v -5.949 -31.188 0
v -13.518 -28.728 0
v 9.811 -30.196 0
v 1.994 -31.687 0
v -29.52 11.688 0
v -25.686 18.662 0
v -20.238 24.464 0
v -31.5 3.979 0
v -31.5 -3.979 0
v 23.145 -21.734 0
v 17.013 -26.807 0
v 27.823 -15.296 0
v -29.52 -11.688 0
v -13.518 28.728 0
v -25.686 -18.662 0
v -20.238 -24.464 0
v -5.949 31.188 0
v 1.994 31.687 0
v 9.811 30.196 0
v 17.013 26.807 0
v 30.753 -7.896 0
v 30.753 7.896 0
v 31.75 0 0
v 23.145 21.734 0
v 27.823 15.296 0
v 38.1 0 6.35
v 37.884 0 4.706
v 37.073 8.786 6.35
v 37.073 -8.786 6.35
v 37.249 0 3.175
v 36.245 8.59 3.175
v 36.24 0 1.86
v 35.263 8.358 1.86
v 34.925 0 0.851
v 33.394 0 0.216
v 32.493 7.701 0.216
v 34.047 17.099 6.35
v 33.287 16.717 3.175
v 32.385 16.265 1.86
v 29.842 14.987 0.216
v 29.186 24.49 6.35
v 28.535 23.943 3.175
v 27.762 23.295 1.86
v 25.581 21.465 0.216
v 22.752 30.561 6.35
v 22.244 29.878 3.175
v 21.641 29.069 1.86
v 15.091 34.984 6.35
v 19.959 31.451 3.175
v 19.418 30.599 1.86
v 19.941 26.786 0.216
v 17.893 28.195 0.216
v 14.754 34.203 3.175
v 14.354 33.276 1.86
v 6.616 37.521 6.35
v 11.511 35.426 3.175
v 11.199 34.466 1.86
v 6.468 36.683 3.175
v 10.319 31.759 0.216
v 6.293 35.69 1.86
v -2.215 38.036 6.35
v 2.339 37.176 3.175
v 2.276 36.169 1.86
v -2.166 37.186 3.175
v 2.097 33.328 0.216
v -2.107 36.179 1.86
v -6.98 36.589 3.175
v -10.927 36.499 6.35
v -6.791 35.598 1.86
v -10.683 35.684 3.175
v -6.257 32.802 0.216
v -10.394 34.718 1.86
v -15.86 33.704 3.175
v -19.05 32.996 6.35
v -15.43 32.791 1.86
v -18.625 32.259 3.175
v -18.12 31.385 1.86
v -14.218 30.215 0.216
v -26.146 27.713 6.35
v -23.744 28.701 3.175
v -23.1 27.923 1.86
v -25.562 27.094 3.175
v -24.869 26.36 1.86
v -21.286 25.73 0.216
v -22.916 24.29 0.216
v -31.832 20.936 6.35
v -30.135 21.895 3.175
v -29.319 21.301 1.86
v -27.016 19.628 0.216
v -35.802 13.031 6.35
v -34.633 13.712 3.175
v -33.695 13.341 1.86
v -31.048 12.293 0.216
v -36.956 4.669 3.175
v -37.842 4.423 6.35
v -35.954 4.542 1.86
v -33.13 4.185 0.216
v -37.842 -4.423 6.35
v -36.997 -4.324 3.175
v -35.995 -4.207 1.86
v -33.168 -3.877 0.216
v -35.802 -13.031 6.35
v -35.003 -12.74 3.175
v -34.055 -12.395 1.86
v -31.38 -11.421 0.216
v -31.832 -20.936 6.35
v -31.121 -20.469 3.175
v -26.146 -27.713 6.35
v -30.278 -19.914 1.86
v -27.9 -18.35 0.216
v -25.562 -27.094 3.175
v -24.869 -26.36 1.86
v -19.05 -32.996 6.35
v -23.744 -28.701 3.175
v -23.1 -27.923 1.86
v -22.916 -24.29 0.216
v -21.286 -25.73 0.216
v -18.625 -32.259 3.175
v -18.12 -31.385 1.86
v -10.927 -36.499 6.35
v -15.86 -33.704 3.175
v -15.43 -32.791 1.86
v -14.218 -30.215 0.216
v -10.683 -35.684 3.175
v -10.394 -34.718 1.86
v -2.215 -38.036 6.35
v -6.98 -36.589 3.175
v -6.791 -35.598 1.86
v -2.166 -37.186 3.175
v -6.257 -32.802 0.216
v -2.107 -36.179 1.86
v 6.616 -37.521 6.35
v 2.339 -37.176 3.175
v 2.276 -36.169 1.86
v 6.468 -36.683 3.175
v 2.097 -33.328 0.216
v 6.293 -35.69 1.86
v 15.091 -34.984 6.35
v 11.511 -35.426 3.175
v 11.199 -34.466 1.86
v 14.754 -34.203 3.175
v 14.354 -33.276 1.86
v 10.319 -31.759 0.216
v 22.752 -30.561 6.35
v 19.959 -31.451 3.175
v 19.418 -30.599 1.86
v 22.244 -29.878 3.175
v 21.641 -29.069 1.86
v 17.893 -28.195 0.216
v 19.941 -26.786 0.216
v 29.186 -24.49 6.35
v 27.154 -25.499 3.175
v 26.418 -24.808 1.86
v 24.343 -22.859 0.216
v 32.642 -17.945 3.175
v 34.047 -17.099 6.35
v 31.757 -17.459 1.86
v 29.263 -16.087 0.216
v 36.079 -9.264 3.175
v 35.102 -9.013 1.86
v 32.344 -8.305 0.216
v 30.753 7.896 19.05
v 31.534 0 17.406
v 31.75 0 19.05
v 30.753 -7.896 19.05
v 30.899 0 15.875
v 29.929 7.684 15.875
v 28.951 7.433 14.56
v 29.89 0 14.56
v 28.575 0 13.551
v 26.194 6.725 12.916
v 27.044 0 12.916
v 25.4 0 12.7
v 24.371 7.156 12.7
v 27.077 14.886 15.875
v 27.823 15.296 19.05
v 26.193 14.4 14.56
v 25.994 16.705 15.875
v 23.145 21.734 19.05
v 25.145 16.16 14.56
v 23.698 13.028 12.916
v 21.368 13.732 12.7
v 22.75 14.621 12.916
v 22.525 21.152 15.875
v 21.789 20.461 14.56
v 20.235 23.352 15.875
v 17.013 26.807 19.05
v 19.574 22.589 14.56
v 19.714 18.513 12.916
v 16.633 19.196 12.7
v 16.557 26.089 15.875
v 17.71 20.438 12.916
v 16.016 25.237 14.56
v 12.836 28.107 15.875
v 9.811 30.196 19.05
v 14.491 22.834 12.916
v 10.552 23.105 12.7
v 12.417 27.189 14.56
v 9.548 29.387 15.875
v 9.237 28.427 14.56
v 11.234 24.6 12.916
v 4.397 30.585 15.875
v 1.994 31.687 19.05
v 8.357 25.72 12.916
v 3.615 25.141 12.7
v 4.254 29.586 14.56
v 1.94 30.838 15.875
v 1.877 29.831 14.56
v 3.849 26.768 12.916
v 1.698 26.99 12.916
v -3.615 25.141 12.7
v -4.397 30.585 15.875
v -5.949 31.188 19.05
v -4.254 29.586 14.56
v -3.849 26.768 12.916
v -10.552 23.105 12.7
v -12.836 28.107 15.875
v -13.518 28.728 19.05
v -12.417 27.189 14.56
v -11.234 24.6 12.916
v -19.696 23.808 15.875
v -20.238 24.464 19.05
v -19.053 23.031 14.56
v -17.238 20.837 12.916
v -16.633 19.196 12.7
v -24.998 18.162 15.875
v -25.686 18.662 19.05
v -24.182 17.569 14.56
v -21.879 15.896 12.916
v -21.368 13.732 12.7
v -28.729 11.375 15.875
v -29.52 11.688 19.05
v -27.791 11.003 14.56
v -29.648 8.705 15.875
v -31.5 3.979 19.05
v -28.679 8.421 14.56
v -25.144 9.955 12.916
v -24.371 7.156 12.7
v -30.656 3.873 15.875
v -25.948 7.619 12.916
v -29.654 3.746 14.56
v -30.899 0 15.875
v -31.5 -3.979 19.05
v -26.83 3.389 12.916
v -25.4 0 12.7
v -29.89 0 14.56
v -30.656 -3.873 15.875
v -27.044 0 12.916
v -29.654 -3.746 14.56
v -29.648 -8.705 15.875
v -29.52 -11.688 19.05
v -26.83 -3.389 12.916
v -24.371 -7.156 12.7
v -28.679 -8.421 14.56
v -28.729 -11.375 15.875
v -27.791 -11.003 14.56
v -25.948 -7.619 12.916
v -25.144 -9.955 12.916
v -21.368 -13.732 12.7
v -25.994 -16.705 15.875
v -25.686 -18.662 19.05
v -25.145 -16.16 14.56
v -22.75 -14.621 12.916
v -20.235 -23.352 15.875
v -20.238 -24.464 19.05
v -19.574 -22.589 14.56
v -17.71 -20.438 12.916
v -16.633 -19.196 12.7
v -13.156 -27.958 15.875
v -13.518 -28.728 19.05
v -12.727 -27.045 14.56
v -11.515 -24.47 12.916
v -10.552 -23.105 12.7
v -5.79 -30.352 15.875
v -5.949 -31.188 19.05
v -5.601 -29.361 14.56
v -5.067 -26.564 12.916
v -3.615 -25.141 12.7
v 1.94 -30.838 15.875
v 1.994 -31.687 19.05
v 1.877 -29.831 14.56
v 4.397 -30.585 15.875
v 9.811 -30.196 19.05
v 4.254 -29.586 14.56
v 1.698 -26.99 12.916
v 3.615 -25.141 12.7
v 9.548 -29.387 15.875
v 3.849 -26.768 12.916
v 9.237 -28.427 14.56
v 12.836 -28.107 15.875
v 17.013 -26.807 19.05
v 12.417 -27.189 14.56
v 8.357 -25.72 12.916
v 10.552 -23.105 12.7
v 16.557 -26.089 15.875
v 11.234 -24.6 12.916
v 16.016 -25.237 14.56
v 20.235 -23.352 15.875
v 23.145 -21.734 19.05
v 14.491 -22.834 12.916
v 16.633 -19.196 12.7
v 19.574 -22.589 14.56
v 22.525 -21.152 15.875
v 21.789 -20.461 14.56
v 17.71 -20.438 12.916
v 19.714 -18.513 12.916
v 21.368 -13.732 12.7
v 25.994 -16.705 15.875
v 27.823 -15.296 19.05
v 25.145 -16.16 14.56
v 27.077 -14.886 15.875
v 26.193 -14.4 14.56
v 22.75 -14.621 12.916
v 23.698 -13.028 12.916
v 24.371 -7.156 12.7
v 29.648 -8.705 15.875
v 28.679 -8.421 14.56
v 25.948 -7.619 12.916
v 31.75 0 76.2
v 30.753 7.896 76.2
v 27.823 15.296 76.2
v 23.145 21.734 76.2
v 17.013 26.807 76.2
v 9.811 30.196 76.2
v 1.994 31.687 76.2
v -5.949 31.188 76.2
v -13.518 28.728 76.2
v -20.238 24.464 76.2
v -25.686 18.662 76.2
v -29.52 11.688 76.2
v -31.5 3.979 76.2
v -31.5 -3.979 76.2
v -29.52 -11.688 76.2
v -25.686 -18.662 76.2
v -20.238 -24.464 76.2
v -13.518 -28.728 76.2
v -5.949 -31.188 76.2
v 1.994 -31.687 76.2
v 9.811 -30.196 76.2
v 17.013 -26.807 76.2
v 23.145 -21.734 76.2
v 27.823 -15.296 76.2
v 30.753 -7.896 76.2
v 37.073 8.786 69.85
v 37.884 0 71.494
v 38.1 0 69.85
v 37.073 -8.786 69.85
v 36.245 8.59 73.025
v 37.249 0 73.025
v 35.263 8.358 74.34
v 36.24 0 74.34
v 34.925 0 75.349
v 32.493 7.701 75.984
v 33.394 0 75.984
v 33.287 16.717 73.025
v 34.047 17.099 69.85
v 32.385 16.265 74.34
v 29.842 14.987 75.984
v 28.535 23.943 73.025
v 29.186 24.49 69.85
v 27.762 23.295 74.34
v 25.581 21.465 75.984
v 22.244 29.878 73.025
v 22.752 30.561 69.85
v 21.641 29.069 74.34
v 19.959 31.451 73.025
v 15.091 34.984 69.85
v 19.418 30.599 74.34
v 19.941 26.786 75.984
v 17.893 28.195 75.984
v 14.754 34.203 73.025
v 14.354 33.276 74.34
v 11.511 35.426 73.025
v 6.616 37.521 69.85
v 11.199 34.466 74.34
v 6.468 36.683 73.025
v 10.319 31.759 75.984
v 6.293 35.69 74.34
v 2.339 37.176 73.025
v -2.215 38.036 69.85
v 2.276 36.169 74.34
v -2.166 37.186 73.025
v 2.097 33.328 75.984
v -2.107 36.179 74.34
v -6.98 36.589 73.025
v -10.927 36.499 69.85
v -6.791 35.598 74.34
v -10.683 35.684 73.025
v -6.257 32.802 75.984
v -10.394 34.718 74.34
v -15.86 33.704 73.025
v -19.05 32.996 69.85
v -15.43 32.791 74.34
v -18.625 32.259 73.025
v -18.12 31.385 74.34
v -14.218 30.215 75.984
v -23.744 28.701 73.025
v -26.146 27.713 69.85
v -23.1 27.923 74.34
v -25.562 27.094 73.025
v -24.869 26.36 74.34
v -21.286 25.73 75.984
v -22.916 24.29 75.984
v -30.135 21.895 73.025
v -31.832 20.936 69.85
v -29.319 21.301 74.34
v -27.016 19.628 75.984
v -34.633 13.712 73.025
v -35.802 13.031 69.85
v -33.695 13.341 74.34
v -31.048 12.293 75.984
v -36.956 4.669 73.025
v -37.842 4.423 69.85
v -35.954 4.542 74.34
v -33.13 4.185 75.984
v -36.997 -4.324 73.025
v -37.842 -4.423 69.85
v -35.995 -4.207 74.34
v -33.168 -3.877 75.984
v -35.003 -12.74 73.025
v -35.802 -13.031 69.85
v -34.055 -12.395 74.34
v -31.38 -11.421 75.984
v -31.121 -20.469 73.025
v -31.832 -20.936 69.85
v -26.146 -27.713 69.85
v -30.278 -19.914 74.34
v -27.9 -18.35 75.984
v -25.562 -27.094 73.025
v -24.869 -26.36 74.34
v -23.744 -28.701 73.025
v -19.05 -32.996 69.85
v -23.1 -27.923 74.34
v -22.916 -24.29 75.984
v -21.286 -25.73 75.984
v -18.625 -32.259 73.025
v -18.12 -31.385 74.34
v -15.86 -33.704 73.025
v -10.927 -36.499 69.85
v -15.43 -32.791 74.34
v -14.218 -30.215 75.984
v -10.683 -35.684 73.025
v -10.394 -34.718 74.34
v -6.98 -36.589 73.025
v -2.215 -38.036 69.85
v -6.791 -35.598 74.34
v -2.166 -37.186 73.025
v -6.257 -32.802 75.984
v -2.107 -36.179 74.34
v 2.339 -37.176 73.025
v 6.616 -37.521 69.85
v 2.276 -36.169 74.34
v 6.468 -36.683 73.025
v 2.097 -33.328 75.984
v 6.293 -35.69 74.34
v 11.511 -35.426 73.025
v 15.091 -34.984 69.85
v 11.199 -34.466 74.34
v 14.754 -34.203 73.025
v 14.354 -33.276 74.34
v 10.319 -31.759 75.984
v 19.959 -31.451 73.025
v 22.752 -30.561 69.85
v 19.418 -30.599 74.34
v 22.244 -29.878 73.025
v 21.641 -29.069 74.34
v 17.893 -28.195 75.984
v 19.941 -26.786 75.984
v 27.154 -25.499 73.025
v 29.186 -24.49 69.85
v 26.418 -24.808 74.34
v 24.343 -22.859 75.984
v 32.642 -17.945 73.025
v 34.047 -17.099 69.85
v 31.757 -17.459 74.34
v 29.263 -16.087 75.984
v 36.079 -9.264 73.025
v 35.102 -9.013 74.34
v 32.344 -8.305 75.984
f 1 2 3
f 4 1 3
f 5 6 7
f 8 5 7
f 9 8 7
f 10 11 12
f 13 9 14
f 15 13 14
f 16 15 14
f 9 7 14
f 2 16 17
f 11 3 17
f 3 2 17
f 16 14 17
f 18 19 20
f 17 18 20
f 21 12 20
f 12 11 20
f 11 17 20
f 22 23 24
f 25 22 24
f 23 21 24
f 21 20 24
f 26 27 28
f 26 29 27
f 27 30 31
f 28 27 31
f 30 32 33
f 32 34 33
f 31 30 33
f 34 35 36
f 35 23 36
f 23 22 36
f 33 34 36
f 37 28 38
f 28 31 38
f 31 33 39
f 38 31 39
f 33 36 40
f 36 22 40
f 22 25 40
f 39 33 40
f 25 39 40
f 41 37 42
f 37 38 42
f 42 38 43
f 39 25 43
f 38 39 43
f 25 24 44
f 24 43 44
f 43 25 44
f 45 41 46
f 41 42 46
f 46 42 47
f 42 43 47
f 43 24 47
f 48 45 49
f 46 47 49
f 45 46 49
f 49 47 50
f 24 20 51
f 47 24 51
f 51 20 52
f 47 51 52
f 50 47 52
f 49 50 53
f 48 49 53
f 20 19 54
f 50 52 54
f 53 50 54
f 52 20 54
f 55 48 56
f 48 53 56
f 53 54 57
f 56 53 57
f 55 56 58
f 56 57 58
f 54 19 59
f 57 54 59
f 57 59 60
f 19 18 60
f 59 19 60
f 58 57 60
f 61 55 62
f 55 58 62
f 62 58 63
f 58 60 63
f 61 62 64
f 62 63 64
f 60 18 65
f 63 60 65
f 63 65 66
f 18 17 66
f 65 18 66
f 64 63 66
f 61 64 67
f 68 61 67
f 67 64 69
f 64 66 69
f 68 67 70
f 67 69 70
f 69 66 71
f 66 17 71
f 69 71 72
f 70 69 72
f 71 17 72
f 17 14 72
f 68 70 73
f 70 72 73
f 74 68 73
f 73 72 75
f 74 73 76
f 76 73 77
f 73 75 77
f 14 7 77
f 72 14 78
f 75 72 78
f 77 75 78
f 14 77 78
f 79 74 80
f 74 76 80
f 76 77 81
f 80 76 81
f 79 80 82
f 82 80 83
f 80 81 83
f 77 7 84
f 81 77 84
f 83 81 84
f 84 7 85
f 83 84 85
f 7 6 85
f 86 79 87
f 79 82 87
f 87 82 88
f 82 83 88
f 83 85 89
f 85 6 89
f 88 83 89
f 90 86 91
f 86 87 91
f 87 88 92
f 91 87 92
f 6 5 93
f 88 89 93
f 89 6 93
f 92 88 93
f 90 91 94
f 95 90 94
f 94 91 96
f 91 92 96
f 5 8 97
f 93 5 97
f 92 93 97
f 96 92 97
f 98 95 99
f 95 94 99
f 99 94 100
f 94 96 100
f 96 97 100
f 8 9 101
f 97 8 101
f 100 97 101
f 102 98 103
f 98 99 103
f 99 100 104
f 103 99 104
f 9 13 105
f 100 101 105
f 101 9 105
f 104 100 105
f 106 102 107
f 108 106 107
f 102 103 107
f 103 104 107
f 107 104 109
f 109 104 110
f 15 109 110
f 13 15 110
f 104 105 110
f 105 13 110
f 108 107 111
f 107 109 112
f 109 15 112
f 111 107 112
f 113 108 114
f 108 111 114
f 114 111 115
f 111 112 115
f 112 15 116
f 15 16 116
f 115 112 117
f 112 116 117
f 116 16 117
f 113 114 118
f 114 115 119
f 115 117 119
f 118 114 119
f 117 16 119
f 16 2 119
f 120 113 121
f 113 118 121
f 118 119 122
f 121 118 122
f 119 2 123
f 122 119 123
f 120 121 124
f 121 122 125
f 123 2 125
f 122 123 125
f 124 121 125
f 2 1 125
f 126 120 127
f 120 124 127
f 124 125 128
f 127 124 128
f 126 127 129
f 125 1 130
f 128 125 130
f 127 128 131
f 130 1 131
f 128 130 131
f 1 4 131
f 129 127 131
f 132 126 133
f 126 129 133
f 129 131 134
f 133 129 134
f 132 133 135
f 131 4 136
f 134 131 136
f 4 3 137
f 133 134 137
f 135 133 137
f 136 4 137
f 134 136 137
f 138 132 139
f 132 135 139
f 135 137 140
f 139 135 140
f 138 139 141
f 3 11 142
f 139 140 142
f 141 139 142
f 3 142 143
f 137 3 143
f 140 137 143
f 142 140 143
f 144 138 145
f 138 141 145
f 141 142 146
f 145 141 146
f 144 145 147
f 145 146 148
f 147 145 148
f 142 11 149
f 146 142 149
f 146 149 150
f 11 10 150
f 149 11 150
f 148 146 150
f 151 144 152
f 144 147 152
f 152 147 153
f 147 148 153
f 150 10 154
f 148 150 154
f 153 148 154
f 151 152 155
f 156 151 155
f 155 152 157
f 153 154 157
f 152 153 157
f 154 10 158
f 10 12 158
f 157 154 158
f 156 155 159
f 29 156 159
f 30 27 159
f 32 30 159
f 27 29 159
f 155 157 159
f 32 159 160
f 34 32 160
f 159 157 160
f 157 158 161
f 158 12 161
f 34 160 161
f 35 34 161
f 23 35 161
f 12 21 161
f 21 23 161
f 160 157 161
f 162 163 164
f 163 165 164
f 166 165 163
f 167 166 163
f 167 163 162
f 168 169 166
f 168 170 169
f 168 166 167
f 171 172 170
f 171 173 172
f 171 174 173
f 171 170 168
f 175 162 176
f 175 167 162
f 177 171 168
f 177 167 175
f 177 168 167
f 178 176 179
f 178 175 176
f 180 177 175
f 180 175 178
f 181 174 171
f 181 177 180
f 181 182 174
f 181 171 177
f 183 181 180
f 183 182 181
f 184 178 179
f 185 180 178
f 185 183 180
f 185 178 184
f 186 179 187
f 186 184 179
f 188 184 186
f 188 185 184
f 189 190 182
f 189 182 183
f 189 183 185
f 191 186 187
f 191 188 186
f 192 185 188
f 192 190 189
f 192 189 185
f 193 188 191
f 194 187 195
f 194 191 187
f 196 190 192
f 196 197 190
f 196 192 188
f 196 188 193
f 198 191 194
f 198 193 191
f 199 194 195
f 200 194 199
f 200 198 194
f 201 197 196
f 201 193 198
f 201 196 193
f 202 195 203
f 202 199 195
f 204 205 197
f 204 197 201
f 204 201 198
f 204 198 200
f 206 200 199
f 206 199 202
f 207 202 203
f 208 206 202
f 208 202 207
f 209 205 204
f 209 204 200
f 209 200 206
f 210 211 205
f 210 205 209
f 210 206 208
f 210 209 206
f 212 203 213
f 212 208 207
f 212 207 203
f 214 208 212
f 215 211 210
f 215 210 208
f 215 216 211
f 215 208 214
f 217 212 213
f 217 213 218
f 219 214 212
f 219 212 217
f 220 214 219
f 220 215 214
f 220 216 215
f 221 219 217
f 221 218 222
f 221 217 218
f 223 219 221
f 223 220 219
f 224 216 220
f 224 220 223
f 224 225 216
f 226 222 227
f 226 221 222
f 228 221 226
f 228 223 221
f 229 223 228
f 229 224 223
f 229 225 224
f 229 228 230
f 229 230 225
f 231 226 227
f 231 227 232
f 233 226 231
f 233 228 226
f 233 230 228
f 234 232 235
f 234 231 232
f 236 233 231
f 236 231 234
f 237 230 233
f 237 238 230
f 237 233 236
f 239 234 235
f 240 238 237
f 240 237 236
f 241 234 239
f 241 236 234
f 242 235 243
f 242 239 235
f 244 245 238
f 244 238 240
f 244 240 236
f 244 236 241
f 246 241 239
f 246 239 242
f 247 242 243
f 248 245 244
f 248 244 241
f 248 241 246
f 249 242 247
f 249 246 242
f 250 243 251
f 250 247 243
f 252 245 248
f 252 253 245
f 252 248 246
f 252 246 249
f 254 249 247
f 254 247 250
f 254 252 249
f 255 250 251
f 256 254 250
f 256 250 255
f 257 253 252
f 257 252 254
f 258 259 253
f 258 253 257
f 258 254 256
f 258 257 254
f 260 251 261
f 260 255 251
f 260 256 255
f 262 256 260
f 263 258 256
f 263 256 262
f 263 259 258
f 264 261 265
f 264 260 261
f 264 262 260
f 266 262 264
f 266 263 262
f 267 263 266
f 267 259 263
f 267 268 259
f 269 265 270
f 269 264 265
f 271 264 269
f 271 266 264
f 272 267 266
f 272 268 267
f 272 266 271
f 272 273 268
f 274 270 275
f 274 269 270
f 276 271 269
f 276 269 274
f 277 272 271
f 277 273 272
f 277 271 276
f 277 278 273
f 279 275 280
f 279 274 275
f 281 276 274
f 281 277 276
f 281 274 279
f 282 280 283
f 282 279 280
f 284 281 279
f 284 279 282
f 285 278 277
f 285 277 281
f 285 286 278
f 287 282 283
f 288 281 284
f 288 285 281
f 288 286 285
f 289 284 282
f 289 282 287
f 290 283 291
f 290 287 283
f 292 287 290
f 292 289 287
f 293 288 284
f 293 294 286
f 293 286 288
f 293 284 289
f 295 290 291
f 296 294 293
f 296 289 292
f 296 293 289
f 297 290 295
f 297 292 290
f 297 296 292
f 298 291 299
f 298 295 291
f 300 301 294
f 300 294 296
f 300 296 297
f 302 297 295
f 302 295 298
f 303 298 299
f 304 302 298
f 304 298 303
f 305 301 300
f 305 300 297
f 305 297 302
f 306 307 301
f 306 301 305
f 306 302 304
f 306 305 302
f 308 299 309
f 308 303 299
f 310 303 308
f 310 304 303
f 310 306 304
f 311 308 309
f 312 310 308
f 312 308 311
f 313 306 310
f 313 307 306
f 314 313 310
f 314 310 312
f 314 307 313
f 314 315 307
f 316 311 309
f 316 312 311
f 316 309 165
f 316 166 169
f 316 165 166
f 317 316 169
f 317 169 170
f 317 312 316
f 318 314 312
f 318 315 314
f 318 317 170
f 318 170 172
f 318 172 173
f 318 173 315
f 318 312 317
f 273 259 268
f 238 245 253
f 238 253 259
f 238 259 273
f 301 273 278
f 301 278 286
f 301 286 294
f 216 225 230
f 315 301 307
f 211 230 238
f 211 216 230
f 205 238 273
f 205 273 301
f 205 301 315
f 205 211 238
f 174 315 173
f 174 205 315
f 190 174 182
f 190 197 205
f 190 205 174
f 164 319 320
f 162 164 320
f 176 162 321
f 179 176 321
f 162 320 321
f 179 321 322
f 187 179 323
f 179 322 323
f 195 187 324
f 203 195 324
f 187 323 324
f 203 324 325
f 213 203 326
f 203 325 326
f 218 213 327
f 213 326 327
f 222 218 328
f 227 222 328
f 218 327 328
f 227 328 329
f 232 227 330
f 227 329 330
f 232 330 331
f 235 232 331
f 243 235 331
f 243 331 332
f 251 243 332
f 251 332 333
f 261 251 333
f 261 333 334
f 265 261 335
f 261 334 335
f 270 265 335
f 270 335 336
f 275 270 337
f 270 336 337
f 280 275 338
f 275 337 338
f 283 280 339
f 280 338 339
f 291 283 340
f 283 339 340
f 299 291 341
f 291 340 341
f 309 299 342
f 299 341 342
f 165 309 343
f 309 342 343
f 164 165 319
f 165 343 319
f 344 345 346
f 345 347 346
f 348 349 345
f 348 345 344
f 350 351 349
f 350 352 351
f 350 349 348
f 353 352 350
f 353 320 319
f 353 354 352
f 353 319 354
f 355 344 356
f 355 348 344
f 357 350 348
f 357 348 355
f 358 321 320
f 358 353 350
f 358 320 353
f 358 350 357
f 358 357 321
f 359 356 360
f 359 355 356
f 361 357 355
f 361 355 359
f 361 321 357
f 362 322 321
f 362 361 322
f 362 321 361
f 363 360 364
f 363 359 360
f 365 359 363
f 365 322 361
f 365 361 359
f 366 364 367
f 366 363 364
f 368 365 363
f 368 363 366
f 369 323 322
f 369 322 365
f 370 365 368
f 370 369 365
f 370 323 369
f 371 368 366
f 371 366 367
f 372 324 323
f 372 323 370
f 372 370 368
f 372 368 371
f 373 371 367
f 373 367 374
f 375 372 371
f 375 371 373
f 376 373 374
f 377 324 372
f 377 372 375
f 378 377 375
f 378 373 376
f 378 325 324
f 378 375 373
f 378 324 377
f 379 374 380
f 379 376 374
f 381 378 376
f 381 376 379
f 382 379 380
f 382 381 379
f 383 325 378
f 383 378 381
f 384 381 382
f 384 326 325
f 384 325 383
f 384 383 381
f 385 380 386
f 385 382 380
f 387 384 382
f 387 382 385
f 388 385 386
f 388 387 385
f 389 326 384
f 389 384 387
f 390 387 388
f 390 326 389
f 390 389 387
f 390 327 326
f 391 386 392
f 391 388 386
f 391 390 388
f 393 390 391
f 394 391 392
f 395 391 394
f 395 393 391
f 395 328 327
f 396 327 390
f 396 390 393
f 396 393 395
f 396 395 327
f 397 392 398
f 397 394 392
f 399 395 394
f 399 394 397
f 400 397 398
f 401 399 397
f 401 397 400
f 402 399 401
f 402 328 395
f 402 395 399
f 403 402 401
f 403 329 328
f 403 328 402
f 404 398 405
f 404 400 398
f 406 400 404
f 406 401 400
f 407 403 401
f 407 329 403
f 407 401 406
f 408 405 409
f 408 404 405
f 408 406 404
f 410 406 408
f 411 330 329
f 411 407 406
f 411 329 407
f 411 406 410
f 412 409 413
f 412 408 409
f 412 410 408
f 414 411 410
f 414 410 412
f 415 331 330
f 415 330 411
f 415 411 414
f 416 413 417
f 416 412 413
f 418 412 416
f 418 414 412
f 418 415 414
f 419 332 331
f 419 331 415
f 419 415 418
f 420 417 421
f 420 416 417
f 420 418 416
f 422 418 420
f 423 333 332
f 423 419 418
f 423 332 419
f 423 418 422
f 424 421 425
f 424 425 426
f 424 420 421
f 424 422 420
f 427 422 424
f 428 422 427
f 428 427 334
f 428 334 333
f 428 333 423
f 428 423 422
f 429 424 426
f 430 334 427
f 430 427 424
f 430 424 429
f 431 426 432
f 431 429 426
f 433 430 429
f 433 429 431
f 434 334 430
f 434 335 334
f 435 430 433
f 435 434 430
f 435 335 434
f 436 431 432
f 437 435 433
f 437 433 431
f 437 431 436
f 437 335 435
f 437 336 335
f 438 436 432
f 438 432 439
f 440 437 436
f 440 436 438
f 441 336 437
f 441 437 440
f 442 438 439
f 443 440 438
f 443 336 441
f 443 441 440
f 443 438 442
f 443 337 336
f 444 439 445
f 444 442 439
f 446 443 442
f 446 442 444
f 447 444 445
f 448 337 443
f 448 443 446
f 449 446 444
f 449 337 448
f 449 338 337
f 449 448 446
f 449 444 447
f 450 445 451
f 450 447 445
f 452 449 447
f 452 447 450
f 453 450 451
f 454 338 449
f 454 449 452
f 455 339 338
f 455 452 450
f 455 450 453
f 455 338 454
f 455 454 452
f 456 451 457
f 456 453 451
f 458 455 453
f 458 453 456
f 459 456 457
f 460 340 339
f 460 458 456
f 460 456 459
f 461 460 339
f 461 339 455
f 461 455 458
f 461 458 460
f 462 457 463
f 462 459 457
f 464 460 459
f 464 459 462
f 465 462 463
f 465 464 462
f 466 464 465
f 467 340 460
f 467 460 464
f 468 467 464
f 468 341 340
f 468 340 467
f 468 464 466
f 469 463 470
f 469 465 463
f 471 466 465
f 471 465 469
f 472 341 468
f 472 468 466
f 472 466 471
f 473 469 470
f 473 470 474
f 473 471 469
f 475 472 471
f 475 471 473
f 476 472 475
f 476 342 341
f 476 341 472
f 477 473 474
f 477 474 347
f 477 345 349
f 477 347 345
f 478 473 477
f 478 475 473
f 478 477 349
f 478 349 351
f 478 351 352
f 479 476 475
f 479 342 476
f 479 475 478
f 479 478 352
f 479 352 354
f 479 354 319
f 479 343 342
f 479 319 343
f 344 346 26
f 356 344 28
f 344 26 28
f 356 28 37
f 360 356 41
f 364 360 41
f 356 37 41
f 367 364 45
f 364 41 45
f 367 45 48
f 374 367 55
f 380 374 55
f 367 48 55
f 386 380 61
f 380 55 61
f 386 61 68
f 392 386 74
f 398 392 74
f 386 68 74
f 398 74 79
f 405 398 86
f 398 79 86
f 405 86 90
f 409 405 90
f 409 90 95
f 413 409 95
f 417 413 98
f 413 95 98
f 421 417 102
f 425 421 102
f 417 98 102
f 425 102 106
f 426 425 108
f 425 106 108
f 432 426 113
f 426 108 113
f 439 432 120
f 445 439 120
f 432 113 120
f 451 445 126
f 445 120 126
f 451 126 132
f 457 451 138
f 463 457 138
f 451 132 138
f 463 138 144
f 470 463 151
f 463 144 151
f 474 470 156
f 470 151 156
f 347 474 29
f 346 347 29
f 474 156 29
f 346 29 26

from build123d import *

# Parameters (mm, degrees)
F0_R     = 38.1
F1_DEPTH = 76.2
F2_R     = 6.35
F3_R     = 31.75
F4_DEPTH = 63.5
F5_R     = 6.35


with BuildPart() as f1:
    # F0 (on Top) → F1 (new body)
    with BuildSketch(Plane.XY):
        Circle(F0_R)
    extrude(amount=F1_DEPTH)

    # F2
    f2_edges = [f1.edges().sort_by_distance(p)[0] for p in [
        (-38.1, 0, 76.2),
        (-38.1, 0, 0),
    ]]
    fillet(f2_edges, radius=F2_R)

    # F3 (on face) → F4 (cut)
    with BuildSketch(Plane.XY.offset(76.2)):
        Circle(F3_R)
    extrude(amount=-F4_DEPTH, mode=Mode.SUBTRACT)

    # F5
    f5_edges = [f1.edges().sort_by_distance(p)[0] for p in [
        (-31.75, 0, 12.7),
    ]]
    fillet(f5_edges, radius=F5_R)


solid = f1.part
